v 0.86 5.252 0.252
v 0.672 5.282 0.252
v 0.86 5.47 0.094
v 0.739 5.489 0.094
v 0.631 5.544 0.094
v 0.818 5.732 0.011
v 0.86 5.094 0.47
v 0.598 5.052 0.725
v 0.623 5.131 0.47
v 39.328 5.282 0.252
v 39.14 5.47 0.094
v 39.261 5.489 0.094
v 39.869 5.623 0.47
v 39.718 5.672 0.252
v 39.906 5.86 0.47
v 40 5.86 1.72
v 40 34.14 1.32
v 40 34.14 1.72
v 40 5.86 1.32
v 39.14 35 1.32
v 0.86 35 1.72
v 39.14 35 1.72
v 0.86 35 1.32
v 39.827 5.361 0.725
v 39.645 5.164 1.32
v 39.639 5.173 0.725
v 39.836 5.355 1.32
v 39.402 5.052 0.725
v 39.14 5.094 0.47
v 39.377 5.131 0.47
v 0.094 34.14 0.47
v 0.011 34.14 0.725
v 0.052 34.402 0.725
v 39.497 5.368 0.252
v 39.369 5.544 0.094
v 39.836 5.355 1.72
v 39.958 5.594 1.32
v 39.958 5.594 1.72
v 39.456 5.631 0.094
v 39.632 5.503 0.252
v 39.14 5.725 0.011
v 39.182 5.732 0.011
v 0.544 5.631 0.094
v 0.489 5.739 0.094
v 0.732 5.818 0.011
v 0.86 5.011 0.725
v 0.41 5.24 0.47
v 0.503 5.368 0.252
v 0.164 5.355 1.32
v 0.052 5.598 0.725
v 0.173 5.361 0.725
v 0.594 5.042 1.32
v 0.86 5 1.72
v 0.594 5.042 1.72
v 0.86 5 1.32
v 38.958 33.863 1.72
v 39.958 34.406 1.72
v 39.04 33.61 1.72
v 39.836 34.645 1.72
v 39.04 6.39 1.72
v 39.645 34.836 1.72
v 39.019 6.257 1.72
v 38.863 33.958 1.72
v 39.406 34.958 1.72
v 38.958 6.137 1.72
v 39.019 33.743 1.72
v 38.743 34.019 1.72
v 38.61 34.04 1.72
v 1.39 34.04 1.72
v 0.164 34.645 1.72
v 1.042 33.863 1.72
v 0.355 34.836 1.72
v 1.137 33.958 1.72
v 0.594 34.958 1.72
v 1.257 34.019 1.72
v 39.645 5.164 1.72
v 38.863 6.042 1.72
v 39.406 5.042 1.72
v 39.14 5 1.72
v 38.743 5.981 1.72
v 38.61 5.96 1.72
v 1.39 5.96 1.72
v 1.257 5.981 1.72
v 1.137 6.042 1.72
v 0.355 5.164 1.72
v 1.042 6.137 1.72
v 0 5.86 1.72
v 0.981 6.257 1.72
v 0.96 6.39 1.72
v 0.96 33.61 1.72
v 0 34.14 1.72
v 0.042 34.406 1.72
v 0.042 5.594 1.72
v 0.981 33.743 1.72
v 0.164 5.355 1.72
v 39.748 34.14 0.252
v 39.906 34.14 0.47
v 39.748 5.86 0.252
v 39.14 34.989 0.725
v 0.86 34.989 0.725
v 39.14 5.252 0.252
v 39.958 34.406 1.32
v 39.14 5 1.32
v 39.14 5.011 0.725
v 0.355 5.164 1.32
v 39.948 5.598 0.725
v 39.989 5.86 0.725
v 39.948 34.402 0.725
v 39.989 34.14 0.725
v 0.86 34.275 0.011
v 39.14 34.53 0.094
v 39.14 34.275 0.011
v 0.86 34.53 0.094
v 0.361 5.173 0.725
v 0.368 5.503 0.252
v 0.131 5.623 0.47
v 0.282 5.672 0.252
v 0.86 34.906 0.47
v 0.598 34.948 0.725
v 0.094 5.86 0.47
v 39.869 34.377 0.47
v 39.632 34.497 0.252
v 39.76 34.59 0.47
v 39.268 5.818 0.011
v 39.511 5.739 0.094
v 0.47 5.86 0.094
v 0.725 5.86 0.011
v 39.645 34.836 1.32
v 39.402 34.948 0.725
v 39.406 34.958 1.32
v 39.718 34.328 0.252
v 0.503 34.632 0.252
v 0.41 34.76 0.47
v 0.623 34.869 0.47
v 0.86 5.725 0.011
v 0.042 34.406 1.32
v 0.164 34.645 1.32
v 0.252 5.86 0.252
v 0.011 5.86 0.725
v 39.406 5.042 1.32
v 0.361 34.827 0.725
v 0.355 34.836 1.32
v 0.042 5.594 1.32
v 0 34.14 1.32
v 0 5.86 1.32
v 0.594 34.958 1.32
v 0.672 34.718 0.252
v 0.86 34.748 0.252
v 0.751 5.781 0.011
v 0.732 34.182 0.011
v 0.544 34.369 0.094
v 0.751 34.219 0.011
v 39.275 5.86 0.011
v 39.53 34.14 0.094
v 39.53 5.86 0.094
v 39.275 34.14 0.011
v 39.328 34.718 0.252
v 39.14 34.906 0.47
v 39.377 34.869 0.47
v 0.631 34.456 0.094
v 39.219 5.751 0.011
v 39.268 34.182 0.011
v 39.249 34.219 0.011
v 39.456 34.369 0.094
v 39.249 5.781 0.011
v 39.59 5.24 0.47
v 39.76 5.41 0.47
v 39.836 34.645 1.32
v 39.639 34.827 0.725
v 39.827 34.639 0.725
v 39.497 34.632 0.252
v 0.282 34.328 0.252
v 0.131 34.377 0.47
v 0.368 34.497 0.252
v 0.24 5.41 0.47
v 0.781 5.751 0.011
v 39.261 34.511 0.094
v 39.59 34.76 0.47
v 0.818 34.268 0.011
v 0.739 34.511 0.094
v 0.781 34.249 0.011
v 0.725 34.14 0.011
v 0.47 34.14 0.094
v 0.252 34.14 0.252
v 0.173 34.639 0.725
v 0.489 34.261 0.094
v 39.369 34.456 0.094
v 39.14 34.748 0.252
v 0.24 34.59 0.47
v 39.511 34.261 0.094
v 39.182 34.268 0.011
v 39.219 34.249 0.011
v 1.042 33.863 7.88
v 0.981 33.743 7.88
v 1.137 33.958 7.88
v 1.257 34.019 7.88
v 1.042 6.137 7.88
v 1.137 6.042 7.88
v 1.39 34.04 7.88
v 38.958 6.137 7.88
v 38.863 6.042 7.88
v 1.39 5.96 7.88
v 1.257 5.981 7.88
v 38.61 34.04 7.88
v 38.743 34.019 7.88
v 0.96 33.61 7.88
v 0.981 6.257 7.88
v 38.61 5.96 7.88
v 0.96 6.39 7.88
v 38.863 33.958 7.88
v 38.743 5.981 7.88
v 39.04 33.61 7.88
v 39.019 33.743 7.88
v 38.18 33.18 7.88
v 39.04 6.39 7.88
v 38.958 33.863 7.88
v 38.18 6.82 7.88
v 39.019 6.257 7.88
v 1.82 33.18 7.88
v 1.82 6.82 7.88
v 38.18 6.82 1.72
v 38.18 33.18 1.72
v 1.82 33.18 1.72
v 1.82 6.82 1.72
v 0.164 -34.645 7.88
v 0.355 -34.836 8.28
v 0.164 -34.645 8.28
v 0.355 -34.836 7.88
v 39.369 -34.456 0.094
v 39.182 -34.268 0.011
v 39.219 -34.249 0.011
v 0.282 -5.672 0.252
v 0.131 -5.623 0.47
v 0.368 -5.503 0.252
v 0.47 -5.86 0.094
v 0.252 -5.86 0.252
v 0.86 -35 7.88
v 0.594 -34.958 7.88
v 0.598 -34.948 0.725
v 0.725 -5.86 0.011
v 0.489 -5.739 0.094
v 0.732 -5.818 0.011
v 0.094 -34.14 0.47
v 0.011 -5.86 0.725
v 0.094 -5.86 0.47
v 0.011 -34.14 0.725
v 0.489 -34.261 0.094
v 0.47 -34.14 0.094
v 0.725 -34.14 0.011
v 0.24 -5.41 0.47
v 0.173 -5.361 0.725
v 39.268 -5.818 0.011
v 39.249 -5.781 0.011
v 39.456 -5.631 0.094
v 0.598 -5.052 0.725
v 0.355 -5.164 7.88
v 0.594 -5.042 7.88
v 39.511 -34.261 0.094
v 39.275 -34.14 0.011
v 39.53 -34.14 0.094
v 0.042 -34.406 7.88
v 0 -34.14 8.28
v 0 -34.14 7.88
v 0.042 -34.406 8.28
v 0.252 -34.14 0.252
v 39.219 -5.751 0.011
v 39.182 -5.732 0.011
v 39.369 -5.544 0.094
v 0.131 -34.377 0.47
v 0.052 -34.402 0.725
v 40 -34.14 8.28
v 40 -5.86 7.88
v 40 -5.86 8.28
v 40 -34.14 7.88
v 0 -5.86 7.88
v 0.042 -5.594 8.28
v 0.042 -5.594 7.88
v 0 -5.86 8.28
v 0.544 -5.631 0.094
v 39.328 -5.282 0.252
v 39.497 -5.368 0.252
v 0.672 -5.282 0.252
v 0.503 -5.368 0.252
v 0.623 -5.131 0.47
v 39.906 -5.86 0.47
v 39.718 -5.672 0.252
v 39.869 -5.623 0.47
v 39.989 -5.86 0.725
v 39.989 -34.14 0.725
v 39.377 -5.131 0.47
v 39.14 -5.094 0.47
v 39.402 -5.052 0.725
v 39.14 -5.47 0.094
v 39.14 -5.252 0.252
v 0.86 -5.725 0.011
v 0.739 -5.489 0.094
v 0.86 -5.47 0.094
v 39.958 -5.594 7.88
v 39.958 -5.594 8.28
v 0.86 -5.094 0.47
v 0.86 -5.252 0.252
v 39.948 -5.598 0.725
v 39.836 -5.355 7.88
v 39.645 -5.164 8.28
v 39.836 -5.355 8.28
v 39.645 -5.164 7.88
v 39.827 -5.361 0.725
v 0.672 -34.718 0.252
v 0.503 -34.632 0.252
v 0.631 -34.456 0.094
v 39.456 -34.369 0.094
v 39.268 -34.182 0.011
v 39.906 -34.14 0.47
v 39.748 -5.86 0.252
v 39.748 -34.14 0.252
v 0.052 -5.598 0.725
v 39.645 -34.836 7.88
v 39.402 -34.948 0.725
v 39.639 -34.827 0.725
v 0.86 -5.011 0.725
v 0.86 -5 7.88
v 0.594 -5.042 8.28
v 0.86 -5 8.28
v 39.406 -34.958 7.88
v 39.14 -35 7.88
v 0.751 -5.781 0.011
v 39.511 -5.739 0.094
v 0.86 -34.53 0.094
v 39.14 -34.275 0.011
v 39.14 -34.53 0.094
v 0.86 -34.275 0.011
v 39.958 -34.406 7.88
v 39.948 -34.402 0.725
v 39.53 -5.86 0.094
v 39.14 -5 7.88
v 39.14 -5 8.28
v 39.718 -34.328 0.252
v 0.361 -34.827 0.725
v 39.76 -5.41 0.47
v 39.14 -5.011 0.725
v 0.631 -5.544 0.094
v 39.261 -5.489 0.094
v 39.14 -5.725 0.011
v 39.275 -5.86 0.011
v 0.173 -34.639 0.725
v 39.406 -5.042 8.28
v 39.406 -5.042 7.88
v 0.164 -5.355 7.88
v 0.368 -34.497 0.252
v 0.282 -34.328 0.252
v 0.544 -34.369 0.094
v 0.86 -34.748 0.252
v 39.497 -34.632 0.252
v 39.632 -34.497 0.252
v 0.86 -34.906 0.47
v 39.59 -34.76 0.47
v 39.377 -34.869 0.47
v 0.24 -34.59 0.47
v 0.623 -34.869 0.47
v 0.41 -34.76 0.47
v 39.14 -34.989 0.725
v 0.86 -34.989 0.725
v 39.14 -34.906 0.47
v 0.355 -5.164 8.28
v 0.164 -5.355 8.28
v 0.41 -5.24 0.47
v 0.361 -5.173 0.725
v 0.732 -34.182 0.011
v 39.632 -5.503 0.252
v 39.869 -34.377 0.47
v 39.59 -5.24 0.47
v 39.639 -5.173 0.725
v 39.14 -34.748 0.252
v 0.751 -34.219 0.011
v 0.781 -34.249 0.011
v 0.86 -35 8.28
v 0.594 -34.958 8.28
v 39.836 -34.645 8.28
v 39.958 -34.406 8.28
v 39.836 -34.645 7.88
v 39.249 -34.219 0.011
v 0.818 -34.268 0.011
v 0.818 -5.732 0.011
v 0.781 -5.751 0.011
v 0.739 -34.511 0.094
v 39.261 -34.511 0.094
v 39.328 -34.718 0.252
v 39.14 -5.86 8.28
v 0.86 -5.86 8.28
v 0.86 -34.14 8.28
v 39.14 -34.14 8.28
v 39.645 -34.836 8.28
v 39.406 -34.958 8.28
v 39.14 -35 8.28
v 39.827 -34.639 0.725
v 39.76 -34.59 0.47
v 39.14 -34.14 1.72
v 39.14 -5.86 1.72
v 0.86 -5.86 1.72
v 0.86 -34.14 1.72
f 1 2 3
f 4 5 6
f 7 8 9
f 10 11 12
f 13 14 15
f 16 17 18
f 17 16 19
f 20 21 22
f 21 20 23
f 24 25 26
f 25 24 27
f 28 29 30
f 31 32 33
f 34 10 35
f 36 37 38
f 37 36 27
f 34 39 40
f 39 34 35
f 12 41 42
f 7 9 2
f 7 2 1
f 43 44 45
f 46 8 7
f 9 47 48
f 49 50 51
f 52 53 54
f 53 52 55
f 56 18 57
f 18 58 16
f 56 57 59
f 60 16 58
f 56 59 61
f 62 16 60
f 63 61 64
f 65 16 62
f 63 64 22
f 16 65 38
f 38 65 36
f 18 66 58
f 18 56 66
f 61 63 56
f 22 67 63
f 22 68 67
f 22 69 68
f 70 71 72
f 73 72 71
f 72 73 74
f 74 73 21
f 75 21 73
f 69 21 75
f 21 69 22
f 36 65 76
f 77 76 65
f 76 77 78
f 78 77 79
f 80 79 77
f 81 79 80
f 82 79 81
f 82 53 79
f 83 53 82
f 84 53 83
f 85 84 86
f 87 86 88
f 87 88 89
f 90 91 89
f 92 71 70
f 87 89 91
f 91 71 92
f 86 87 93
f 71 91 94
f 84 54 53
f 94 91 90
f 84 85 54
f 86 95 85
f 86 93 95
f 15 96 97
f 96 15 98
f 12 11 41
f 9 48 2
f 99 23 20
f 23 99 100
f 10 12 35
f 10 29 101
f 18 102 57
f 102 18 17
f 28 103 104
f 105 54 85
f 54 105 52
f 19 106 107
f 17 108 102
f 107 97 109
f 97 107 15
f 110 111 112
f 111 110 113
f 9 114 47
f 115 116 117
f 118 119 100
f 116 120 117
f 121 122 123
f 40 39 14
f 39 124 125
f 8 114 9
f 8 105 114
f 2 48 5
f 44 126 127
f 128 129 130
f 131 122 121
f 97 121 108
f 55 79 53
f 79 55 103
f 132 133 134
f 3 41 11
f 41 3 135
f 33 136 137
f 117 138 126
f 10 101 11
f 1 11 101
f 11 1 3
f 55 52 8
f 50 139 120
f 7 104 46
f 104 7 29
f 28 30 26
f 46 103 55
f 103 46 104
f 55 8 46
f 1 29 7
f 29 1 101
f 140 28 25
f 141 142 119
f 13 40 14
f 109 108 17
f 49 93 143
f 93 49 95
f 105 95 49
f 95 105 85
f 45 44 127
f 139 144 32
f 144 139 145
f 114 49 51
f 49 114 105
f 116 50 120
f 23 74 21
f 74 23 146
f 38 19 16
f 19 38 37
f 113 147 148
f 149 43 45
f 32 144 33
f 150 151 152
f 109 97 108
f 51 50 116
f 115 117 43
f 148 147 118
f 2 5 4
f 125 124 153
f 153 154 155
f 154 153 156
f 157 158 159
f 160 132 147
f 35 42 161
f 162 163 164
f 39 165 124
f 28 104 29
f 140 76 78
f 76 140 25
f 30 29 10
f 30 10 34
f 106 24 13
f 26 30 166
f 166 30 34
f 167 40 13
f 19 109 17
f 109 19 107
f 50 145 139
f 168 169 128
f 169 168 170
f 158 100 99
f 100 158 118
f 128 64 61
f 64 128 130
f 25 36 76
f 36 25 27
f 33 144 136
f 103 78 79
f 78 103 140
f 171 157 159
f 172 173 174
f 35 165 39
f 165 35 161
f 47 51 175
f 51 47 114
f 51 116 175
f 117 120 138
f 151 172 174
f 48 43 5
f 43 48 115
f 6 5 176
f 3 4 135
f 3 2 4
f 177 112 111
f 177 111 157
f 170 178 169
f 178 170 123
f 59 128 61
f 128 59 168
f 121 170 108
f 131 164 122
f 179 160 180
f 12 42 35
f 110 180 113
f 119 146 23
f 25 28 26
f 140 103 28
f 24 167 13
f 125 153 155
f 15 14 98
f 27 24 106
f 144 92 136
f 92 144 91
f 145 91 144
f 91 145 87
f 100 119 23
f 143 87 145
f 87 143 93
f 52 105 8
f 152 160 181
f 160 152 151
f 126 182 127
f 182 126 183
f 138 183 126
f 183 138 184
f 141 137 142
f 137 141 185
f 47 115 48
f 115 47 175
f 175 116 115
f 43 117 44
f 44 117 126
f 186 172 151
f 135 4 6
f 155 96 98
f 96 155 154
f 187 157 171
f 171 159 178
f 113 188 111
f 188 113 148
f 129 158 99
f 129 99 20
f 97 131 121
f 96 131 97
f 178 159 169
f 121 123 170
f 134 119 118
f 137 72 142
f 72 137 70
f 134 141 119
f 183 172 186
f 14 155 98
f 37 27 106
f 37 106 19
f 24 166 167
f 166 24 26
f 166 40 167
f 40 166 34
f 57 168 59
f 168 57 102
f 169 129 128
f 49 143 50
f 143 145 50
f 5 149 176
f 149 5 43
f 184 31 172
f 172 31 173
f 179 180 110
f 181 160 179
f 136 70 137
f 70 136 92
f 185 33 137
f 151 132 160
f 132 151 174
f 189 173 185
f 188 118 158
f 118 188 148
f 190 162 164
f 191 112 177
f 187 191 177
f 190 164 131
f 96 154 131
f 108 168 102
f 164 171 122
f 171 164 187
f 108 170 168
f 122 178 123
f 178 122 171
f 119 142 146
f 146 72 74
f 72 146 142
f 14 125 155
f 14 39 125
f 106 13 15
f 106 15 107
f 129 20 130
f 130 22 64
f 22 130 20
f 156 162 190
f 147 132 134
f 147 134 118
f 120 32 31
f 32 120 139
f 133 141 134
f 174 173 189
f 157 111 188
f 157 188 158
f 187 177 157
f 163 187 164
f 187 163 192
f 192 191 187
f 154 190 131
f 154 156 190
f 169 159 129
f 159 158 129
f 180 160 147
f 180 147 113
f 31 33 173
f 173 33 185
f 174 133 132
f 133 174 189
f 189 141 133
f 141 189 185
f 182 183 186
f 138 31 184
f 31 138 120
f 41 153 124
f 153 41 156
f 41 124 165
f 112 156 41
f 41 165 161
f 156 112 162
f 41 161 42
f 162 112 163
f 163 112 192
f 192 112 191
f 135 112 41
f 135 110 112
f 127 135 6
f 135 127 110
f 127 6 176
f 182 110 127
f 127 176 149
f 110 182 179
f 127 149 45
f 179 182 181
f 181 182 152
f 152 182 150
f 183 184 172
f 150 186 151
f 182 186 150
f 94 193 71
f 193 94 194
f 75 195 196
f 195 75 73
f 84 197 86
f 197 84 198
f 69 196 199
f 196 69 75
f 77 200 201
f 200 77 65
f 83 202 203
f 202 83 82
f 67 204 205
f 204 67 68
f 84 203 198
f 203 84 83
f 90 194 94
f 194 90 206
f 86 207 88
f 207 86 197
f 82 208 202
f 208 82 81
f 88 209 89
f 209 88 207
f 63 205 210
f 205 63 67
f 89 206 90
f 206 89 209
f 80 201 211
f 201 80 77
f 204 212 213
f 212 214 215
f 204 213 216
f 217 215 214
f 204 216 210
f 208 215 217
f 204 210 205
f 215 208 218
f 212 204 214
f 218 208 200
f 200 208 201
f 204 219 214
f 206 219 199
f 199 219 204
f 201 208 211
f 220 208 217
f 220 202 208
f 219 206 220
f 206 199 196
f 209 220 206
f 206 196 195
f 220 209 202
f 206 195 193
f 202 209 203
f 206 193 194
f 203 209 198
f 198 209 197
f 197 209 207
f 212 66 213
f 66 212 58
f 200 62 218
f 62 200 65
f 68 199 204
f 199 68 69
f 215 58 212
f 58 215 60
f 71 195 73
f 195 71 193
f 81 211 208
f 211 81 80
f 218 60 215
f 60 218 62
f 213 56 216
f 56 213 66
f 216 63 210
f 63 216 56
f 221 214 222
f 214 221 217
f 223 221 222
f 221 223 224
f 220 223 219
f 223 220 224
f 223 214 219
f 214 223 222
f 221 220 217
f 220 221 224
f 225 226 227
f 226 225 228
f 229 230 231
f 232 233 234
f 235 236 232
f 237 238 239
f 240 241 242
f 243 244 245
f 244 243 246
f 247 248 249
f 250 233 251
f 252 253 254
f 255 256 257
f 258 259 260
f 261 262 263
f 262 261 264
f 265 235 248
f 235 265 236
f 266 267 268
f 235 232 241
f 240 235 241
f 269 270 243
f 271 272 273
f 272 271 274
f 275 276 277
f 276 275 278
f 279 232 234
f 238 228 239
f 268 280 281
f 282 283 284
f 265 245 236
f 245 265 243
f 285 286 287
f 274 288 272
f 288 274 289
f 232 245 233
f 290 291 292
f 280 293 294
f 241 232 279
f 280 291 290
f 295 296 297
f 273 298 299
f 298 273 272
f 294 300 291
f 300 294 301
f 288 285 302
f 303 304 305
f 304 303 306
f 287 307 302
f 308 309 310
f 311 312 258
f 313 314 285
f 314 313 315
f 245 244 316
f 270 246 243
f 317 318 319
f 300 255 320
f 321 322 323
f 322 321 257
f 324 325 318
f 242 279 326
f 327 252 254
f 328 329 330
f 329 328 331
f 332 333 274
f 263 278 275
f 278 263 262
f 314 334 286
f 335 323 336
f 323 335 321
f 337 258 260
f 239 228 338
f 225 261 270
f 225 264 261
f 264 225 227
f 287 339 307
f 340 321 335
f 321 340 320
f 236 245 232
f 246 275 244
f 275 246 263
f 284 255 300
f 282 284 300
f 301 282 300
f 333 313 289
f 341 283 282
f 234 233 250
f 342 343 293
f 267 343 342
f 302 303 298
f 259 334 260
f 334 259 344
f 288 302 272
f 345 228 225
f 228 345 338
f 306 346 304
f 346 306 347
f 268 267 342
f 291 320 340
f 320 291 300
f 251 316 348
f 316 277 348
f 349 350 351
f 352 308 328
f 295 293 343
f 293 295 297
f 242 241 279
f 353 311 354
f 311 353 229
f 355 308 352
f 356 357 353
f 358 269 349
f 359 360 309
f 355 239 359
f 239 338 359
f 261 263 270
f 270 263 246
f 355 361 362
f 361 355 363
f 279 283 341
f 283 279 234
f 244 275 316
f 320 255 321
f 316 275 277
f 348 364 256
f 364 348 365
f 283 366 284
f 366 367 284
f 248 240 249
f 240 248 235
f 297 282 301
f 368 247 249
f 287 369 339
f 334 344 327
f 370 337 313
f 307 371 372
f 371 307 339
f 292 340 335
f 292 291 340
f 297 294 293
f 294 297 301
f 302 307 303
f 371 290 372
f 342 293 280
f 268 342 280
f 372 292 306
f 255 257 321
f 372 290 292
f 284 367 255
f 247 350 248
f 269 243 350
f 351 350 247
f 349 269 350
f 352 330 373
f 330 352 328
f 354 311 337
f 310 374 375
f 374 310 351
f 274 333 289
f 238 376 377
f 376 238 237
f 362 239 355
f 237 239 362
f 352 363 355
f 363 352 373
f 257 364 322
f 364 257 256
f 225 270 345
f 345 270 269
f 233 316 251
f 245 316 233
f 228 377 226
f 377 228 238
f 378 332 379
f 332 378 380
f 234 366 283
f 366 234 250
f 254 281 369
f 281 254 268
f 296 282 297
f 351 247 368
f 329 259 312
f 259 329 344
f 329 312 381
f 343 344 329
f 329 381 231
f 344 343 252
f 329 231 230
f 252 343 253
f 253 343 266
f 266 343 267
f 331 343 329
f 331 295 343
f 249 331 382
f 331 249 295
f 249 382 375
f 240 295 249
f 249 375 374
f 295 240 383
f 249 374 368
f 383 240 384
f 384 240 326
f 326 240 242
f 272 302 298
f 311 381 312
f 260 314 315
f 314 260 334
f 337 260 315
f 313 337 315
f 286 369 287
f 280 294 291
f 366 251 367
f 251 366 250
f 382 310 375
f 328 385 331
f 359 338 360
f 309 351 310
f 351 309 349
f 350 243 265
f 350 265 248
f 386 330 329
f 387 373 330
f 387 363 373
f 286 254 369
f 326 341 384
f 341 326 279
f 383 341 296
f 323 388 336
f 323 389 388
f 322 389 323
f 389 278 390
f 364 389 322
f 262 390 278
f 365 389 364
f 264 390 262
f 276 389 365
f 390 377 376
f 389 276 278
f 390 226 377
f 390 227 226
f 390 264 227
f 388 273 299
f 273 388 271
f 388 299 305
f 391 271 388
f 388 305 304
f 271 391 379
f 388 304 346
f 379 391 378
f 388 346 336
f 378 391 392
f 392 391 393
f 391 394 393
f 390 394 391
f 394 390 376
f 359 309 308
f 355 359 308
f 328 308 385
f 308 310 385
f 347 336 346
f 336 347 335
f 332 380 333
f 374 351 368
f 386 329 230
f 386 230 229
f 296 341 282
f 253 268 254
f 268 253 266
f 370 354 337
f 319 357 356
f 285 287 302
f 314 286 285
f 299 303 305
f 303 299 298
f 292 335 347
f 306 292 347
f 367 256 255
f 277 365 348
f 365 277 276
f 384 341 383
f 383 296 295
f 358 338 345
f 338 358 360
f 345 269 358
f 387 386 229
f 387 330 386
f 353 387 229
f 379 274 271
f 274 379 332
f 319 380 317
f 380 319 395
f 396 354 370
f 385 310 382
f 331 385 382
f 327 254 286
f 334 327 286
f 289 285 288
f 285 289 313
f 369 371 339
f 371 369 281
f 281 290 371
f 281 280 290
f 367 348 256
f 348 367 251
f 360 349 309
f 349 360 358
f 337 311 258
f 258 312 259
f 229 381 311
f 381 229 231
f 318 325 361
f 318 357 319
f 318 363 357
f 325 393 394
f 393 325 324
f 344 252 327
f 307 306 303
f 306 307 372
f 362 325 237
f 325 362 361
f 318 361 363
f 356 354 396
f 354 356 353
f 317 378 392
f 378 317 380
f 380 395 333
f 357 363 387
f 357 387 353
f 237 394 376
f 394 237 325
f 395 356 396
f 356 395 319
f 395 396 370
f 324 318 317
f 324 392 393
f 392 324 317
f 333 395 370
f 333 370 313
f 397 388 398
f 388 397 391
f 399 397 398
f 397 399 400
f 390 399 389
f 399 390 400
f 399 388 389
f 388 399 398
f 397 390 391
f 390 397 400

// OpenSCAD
/**************************************************************
 * PARAMETRIC PRECISE BOX version 1.5    (2022-02-24)         *
 * Copyright (c) Tomas "Arci" Kouba, 2021                     *
 * ---------------------------------------------------------- *
 * Licensed under terms of the                                *
 * Creative Commons Attribution-NonCommercial-ShareAlike 4.0  *
 * International (CC BY-NC-SA 4.0) license                    *
 * ---------------------------------------------------------- *
 * History:                                                   *
 *  1.7 (2022-09-13):                                         *
 *    * Fix finger gap with divider                           *
 *    * Add finger gap adjustment                             *
 *  1.6 (2022-03-10):                                         *
 *    * Add variable divider of box                           *
 *  1.5 (2022-02-24):                                         *
 *    * Add optional text on top part                         *
 *  1.4 (2021-08-31):                                         *
 *    * Fixed depth internal size calculation                 *
 *  1.3 (2021-08-26):                                         *
 *    * Add rounded interrior                                 *
 *  1.2 (2021-08-24):                                         *
 *    * Add external/internal dimensions switch               *
 *    * Add finger gap                                        *
 *  1.1 (2021-03-19):                                         *
 *    * Better/bigger rounded corners                         *
 *    * Fixed bottom part wall Z translation                  *
 *    * Simplified subtracted interiors                       *
 *  1.0 (2021-03-16):                                         *
 *    * Created                                               *
 **************************************************************/

// Preview
main();

/* [Box sizes] */
// Box width (external or internal dimension)
width = 40; // [10:1:200]
// Box height (external or internal dimension)
height = 30; // [10:1:200]
// Box depth (external or internal dimension)
depth = 10; // [5:1:200]
// Dimensions is external (true) or internal (false)
isExternal = true;
// Divide bottom/top (height percent)
divider_percent = 0; // [0:5:90]

/* [Finger gap] */
// Add finger gap
fingerGap = false;
// Finger gap size (25 mm is approx 1 inch)
fingerGapSize = 25; // [5:1:40]

/* [Round corners] */
// Use rounded exterior corners?
rounded = true;
// Corner radius of interrior
interrior_radius = 0; // [0:10]

/* [Texts] */
// Use text on top part
useTextOnTop = false;
// Text on top part
textOnTop = "Some text";
// Size of text on top part
textOnTopSize = 3; // [1:1:15]
// Depth of text on top part
textOnTopDepth = 0.15; // [0.1:0.01:0.4]

/* [Options] */
// Wall thickness (2 lines for small boxes)
wt = .86; // [0.4:.01:2]
// Lid tolerance (space between walls of bottom and top part)
lt = .1; // [0.05:.01:0.5]

/* [Render part] */
// Top part
topPart = true;
// Bottom part
bottomPart = true;

/* [Hidden] */
// Top tolerance (top space between botom walls and roof)
tt = .4;
// Finger gap adjustment
fingerGapAdjustment = .15;
// Inner round (manipulation enhancement)
ir = max(.4, wt / 2);
// Better rounds
$fn = $preview ? $fn : 20; 
// External dimensions (computed)
_width = isExternal ? width : width + 4 * wt + 2 * lt;
_height = isExternal ? height : height + 4 * wt + 2 * lt;
_depth = isExternal ? depth : depth + 4 * wt;
// minimal divider is 2*wt (bottom wall thickness)
// maximal divider is less than 2*wt bellow bottom part
_divider = min(max(2 * wt, _depth * 0.01 * divider_percent), _depth - 4*wt);

module main() {
  if (bottomPart) translate([0, 5, 0]) part_bottom();
  if (topPart) translate([0, 0 - height - 5, 0]) part_top();
}

module part_bottom() {
  difference(){
    union() {
      if (rounded) {
        r_cube([_width, _height, _divider], wt);
      }
      else {
        cube([_width, _height, _divider]);
      }
      translate([wt + lt, wt + lt, 0]) 
        r_cube([_width - 2 * wt - 2 * lt, _height - 2 * wt - 2 * lt, _depth - 2 * wt - tt], ir, false, false);
    }
    // Comparment hole
    translate([2 * wt + lt, 2 * wt + lt, 2 * wt]) 
      r_cube([_width - 4 * wt - 2 * lt, _height - 4 * wt - 2 * lt, _depth - 4 * wt], interrior_radius, true, false);
    if (fingerGap) {
      union() {
        translate([6 * wt + lt + fingerGapSize / 2, 0, _divider + fingerGapSize / 2 + fingerGapAdjustment])
          rotate([-90, 0, 0])
            cylinder(d = fingerGapSize, h = _height); // Gap cylinder
        translate([6 * wt + lt, 0, _divider + fingerGapSize / 2 + fingerGapAdjustment])
          cube([fingerGapSize, _height, _depth - (4 * wt + lt + fingerGapSize / 2)]);
      }
    }
  }
}

module part_top() {
  difference(){
    if (rounded) {
      r_cube([_width, _height, _depth - _divider], wt);
    }
    else {
      cube([_width, _height, _depth - _divider]);
    }
    translate([wt, wt, 2 * wt]) 
      cube([_width - 2 * wt, _height - 2 * wt, _depth]);
    if (useTextOnTop) {
      translate([wt + _width / 2, wt + _height / 2, 0])
        linear_extrude(textOnTopDepth)
          mirror([1, 0, 0])
            text(textOnTop, size = textOnTopSize, 
              halign = "center", valign = "center");
    }
  }    
}


// Helper module for rounded cube
module r_cube(size, radius, bottom_round = true, top_round = false) {
  if(radius == 0) {
    // Do simple cube
    cube(size);
  } else {
    // Do rounded corners
    points = [
      [radius, radius], 
      [size[0] - radius, radius],
      [size[0] - radius, size[1] - radius],
      [radius, size[1] - radius]
    ];
    hull() {
      translate([0, 0, radius]) 
      for(pos = points) {
        translate(pos) {
          if (bottom_round) 
            sphere(r = radius); 
          else 
            cylinder(r = radius, h = tt);
        }
      }
      translate([0, 0, size[2] - (top_round ? radius : tt)]) 
      for(pos = points) {
        translate(pos) {
          if (top_round) 
            sphere(r = radius); 
          else {
            cylinder(r = radius, h = tt);
          }
        }
      }
    }
  }
}
